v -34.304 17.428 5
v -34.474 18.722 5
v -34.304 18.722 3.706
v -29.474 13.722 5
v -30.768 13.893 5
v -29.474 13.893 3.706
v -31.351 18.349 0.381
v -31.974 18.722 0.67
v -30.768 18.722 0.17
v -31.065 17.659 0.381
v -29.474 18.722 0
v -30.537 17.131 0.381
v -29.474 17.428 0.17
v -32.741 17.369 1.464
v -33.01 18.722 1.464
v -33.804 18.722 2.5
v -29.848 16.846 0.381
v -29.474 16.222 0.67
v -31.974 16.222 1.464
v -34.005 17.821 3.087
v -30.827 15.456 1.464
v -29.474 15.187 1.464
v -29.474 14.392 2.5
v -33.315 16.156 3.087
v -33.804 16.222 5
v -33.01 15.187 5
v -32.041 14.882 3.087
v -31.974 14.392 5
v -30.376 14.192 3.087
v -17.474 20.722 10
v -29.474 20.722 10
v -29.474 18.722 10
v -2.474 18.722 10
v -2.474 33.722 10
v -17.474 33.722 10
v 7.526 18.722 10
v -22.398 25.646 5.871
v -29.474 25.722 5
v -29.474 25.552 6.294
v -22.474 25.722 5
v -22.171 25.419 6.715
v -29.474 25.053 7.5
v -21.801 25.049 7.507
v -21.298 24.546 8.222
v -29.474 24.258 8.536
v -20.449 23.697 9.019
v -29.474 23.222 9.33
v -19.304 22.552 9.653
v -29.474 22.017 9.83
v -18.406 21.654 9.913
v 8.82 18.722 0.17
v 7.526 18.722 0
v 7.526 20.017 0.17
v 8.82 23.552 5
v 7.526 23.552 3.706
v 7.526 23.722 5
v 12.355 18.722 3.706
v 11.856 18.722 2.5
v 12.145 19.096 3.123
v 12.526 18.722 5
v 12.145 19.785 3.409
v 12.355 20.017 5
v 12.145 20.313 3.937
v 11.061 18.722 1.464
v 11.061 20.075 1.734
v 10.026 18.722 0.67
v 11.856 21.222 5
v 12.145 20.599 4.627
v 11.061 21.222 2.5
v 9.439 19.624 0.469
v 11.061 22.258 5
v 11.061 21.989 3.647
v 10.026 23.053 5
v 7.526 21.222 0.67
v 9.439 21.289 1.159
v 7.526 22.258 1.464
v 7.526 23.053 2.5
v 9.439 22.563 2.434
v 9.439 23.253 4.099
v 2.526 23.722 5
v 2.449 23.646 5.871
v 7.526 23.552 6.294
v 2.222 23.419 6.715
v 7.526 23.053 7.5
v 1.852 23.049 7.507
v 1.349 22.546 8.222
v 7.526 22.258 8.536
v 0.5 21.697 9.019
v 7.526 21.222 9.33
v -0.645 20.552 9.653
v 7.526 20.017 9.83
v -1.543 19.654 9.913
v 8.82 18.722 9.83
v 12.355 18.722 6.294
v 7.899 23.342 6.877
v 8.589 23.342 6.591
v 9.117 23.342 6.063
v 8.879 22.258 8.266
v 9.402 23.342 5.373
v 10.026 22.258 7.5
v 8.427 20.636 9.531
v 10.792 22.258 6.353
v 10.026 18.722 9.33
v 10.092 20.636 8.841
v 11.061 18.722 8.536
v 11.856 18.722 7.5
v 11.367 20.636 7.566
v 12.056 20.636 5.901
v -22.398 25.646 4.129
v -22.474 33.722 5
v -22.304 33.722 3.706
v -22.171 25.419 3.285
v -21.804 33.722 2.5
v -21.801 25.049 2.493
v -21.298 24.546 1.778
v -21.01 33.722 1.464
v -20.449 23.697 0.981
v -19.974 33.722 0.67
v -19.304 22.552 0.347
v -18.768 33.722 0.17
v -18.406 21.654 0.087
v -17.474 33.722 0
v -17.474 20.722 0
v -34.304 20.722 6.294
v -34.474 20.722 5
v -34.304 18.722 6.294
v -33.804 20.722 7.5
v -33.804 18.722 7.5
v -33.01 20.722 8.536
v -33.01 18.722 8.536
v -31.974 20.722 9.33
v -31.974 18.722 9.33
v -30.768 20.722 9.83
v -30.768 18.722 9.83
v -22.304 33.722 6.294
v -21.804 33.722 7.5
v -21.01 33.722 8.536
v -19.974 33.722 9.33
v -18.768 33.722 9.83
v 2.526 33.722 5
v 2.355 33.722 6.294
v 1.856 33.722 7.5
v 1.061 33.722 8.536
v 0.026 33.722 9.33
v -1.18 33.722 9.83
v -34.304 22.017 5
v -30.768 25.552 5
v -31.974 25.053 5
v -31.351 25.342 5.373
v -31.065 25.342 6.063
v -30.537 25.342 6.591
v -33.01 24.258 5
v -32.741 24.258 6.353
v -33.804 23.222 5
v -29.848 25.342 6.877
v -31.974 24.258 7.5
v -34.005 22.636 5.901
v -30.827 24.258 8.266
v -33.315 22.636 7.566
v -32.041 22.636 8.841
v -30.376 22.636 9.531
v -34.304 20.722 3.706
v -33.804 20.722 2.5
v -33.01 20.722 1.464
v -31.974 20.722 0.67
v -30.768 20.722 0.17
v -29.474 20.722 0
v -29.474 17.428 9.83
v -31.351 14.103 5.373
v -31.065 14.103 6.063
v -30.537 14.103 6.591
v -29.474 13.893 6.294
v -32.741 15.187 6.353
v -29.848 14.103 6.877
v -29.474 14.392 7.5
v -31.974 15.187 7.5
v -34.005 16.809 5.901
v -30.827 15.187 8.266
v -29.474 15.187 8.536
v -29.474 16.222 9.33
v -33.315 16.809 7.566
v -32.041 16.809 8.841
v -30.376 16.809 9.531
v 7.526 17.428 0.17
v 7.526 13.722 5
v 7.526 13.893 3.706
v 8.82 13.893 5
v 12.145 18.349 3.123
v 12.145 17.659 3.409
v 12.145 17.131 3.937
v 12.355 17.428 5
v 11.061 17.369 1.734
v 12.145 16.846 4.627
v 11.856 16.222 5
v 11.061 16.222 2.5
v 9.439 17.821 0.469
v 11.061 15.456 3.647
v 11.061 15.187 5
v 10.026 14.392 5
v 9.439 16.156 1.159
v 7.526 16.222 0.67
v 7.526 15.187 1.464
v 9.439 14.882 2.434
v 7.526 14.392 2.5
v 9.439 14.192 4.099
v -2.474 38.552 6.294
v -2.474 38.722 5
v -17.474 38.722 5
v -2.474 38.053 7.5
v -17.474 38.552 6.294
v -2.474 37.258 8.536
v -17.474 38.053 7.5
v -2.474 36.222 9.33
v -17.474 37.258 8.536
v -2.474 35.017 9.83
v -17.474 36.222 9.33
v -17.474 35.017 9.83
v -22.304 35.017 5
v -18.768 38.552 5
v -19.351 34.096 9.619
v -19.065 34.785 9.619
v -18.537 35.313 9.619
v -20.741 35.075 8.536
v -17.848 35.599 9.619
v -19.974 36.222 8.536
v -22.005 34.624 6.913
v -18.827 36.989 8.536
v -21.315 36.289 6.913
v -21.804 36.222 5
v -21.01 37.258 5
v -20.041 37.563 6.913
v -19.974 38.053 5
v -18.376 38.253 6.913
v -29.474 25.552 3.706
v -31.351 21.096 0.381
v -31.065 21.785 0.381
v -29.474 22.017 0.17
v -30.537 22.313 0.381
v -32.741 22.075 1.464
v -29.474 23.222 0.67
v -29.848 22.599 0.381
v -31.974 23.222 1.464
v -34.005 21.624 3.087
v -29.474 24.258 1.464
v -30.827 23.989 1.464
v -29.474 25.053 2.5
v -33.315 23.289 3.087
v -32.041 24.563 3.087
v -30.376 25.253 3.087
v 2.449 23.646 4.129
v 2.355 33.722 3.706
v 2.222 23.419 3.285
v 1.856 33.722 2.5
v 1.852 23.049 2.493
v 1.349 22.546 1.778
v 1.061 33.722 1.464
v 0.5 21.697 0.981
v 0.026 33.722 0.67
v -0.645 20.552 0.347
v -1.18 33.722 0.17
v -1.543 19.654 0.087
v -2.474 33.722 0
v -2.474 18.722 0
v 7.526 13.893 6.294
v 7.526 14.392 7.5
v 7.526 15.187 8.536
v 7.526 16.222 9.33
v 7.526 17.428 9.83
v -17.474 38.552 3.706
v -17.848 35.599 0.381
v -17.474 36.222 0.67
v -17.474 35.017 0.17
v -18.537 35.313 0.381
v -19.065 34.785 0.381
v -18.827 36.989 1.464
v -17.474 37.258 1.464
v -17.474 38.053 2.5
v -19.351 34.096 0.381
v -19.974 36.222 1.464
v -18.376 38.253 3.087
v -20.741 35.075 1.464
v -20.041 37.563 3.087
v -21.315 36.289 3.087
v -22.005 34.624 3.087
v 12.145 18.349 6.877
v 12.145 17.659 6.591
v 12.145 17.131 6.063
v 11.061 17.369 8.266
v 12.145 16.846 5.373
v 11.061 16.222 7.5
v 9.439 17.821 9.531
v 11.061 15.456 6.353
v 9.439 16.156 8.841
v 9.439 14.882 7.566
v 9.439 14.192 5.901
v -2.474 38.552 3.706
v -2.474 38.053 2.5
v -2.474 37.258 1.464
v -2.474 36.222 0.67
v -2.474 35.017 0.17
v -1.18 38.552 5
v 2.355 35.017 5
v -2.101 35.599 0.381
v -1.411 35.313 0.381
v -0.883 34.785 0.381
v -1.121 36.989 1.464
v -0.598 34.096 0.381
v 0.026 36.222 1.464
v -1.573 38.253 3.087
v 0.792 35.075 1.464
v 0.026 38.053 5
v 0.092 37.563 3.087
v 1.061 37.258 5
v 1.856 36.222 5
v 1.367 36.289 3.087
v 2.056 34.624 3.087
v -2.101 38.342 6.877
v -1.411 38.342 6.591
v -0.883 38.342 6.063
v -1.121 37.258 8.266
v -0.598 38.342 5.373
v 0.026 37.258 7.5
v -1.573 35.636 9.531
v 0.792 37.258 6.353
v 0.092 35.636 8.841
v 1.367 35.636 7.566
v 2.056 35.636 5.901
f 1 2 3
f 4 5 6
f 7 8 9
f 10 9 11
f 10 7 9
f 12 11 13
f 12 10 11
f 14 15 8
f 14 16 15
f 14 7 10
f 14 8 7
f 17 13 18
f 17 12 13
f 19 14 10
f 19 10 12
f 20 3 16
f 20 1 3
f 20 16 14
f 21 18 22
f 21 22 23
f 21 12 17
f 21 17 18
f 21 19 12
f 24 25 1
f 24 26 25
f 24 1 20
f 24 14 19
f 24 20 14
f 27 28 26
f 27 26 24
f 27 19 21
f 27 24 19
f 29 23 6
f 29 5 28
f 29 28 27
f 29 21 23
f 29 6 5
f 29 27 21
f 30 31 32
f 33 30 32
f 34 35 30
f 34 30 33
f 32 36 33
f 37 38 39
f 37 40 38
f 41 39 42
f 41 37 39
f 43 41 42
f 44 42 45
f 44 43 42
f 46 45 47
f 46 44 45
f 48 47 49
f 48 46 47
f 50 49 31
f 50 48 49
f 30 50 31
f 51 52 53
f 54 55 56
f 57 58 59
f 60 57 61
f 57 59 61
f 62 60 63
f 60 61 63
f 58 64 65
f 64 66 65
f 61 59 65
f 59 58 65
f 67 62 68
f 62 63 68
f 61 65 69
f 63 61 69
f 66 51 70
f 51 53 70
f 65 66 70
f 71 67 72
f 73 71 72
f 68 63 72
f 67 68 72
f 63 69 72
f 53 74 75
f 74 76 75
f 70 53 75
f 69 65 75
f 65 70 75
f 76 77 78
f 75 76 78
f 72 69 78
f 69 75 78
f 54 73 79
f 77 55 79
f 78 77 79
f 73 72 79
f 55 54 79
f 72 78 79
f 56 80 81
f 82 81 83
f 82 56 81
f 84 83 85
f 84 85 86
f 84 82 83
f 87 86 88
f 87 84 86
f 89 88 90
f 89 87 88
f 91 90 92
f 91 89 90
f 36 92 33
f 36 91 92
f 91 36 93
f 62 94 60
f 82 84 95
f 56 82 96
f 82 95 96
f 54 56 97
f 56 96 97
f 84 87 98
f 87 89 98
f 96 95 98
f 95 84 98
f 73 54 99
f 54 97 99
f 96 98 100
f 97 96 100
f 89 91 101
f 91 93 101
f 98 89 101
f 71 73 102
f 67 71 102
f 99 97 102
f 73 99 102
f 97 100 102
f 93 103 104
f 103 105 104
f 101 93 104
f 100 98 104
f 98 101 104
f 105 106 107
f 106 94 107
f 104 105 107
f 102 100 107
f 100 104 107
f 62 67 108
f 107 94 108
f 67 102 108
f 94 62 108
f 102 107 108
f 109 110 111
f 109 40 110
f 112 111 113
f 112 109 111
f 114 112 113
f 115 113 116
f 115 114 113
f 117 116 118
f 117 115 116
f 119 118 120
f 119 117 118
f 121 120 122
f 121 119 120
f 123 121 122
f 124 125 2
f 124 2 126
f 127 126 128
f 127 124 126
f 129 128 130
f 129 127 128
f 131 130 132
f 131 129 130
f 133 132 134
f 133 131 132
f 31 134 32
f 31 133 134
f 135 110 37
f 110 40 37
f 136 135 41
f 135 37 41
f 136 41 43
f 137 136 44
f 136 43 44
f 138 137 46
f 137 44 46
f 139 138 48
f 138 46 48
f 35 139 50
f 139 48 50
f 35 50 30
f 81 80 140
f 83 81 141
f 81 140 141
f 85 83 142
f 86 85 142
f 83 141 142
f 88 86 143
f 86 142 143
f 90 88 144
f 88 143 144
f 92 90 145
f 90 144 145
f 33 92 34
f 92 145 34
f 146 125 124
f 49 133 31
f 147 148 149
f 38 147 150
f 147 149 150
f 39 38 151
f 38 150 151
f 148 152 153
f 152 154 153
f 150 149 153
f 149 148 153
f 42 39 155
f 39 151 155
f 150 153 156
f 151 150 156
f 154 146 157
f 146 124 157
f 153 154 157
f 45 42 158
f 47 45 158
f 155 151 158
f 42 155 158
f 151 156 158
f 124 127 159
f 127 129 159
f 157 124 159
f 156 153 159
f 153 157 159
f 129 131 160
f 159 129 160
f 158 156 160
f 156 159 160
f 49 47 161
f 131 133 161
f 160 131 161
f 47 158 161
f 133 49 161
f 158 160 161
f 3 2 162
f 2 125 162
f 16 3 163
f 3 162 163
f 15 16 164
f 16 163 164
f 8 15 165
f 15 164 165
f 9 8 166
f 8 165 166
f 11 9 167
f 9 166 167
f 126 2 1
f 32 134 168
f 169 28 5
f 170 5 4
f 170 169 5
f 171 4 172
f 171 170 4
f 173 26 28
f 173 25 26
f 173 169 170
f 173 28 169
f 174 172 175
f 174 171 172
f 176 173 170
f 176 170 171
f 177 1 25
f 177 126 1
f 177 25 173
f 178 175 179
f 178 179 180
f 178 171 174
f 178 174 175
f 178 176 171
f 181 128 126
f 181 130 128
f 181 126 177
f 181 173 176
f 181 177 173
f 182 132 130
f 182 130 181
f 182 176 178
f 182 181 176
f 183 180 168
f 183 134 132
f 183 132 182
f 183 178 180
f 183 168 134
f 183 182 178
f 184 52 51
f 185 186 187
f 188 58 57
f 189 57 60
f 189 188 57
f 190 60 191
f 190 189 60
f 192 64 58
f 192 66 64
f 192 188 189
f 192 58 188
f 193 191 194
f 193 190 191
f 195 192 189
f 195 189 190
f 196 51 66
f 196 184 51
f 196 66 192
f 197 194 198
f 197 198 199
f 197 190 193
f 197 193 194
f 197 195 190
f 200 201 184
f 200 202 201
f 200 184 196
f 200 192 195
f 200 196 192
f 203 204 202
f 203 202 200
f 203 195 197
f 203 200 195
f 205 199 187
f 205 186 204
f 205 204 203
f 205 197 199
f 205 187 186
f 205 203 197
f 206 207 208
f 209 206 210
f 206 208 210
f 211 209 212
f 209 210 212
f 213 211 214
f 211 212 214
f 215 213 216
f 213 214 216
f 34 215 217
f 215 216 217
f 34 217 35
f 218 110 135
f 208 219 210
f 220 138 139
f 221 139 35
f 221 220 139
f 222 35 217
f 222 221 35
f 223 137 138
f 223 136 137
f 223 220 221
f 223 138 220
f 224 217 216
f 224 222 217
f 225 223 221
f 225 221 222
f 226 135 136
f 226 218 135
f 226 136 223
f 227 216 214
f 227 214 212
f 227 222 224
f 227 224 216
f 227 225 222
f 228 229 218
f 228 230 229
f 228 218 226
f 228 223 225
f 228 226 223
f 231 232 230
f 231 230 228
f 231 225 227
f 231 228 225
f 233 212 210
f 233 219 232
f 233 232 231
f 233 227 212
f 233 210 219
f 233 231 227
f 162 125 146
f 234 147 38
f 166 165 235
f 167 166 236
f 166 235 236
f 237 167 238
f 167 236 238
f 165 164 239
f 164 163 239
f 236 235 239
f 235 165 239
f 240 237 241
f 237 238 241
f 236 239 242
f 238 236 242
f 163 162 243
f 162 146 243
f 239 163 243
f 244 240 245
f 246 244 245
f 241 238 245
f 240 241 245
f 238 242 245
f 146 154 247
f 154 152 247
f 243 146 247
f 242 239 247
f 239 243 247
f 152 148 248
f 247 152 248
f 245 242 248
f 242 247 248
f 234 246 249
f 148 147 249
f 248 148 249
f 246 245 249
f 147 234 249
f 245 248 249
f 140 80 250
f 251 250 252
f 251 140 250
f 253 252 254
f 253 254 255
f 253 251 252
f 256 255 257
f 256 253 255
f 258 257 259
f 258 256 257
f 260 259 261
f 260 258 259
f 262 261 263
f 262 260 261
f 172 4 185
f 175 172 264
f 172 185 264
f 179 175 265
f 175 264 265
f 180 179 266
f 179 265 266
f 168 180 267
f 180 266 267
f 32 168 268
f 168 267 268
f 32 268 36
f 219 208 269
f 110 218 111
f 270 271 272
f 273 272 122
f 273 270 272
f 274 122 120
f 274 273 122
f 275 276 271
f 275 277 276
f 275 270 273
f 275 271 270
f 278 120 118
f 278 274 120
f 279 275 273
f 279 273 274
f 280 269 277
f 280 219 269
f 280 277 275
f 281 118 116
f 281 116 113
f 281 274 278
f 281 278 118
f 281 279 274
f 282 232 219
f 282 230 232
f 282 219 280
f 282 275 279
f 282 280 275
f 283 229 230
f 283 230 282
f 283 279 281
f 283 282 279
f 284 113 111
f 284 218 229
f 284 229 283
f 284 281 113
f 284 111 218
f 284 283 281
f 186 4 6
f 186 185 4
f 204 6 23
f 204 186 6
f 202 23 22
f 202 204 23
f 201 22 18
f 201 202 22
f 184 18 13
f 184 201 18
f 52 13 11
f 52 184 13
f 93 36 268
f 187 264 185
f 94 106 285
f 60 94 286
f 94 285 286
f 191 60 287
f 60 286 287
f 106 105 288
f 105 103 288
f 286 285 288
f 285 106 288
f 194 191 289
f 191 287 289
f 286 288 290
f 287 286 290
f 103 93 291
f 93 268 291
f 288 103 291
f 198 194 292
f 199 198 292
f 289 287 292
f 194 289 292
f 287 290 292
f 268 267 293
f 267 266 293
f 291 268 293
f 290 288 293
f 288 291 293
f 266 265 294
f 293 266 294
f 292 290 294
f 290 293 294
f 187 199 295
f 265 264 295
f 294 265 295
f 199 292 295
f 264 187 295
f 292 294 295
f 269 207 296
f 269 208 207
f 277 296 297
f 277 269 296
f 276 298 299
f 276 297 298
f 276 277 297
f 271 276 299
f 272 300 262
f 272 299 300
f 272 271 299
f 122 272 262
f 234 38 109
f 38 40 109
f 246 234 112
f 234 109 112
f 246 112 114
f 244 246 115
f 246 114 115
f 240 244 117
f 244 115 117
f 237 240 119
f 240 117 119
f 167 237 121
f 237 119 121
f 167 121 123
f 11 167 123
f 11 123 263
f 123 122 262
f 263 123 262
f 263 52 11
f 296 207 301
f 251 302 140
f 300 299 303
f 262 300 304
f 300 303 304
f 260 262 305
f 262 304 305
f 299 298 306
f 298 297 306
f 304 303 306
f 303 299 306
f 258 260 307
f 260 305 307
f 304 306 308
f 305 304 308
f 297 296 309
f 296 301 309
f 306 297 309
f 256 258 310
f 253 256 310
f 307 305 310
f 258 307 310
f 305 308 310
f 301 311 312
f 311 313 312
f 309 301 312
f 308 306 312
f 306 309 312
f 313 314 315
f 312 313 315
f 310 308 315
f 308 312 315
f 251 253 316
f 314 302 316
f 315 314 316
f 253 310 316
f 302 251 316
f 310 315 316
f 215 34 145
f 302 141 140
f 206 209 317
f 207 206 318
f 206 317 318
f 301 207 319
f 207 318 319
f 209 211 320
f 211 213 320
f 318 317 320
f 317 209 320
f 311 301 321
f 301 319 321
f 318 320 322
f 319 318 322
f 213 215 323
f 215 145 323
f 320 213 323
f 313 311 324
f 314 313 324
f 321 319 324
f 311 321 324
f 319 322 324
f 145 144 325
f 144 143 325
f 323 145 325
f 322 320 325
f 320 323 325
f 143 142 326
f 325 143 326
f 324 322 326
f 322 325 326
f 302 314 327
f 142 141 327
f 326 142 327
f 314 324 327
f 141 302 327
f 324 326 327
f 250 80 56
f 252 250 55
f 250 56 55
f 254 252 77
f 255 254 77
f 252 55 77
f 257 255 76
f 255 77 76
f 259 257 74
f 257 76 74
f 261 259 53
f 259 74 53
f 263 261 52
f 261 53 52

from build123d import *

# Parameters (mm, degrees)
F0_W     = 12
F0_H     = 12
F0_W_2   = 10
F0_H_2   = 10
F1_DEPTH = 10
F2_R     = 4.99999


# Not quite as in the source:
# - a fillet or chamfer is up to 0.001 mm smaller than in the source, because OpenCascade refuses the exact size


with BuildPart() as f1:
    # F0 (on Top) → F1 (new body)
    with BuildSketch(Plane.XY):
        Polygon((2.5256457627, 38.7224316552), (-22.4743542373, 38.7224316552), (-22.4743542373, 25.7224316552), (-22.4743542373, 13.7224316552), (2.5256457627, 13.7224316552), (2.5256457627, 23.7224316552), align=None)
        with Locations((-28.4743542373, 19.7224316552)):
            Rectangle(F0_W, F0_H)
        with Locations((7.5256457627, 18.7224316552)):
            Rectangle(F0_W_2, F0_H_2)
    extrude(amount=F1_DEPTH)

    # F2 (radius 5 in the source; OpenCascade refuses exactly that, so slightly less here)
    f2_edges = [f1.edges().sort_by_distance(p)[0] for p in [
        (-22.474354, 38.722432, 5),
        (-22.474354, 32.222432, 10),
        (-34.474354, 19.722432, 10),
        (-34.474354, 25.722432, 5),
        (-34.474354, 13.722432, 5),
        (-34.474354, 19.722432, 0),
        (2.525646, 31.222432, 10),
        (-9.974354, 38.722432, 10),
        (-28.474354, 25.722432, 10),
        (-10.974354, 13.722432, 10),
        (12.525646, 18.722432, 10),
        (7.525646, 23.722432, 10),
        (2.525646, 38.722432, 5),
        (-9.974354, 38.722432, 0),
        (7.525646, 23.722432, 0),
        (2.525646, 31.222432, 0),
        (-22.474354, 32.222432, 0),
        (-28.474354, 25.722432, 0),
        (-10.974354, 13.722432, 0),
        (12.525646, 18.722432, 0),
        (12.525646, 13.722432, 5),
        (12.525646, 23.722432, 5),
    ]]
    fillet(f2_edges, radius=F2_R)


solid = f1.part
